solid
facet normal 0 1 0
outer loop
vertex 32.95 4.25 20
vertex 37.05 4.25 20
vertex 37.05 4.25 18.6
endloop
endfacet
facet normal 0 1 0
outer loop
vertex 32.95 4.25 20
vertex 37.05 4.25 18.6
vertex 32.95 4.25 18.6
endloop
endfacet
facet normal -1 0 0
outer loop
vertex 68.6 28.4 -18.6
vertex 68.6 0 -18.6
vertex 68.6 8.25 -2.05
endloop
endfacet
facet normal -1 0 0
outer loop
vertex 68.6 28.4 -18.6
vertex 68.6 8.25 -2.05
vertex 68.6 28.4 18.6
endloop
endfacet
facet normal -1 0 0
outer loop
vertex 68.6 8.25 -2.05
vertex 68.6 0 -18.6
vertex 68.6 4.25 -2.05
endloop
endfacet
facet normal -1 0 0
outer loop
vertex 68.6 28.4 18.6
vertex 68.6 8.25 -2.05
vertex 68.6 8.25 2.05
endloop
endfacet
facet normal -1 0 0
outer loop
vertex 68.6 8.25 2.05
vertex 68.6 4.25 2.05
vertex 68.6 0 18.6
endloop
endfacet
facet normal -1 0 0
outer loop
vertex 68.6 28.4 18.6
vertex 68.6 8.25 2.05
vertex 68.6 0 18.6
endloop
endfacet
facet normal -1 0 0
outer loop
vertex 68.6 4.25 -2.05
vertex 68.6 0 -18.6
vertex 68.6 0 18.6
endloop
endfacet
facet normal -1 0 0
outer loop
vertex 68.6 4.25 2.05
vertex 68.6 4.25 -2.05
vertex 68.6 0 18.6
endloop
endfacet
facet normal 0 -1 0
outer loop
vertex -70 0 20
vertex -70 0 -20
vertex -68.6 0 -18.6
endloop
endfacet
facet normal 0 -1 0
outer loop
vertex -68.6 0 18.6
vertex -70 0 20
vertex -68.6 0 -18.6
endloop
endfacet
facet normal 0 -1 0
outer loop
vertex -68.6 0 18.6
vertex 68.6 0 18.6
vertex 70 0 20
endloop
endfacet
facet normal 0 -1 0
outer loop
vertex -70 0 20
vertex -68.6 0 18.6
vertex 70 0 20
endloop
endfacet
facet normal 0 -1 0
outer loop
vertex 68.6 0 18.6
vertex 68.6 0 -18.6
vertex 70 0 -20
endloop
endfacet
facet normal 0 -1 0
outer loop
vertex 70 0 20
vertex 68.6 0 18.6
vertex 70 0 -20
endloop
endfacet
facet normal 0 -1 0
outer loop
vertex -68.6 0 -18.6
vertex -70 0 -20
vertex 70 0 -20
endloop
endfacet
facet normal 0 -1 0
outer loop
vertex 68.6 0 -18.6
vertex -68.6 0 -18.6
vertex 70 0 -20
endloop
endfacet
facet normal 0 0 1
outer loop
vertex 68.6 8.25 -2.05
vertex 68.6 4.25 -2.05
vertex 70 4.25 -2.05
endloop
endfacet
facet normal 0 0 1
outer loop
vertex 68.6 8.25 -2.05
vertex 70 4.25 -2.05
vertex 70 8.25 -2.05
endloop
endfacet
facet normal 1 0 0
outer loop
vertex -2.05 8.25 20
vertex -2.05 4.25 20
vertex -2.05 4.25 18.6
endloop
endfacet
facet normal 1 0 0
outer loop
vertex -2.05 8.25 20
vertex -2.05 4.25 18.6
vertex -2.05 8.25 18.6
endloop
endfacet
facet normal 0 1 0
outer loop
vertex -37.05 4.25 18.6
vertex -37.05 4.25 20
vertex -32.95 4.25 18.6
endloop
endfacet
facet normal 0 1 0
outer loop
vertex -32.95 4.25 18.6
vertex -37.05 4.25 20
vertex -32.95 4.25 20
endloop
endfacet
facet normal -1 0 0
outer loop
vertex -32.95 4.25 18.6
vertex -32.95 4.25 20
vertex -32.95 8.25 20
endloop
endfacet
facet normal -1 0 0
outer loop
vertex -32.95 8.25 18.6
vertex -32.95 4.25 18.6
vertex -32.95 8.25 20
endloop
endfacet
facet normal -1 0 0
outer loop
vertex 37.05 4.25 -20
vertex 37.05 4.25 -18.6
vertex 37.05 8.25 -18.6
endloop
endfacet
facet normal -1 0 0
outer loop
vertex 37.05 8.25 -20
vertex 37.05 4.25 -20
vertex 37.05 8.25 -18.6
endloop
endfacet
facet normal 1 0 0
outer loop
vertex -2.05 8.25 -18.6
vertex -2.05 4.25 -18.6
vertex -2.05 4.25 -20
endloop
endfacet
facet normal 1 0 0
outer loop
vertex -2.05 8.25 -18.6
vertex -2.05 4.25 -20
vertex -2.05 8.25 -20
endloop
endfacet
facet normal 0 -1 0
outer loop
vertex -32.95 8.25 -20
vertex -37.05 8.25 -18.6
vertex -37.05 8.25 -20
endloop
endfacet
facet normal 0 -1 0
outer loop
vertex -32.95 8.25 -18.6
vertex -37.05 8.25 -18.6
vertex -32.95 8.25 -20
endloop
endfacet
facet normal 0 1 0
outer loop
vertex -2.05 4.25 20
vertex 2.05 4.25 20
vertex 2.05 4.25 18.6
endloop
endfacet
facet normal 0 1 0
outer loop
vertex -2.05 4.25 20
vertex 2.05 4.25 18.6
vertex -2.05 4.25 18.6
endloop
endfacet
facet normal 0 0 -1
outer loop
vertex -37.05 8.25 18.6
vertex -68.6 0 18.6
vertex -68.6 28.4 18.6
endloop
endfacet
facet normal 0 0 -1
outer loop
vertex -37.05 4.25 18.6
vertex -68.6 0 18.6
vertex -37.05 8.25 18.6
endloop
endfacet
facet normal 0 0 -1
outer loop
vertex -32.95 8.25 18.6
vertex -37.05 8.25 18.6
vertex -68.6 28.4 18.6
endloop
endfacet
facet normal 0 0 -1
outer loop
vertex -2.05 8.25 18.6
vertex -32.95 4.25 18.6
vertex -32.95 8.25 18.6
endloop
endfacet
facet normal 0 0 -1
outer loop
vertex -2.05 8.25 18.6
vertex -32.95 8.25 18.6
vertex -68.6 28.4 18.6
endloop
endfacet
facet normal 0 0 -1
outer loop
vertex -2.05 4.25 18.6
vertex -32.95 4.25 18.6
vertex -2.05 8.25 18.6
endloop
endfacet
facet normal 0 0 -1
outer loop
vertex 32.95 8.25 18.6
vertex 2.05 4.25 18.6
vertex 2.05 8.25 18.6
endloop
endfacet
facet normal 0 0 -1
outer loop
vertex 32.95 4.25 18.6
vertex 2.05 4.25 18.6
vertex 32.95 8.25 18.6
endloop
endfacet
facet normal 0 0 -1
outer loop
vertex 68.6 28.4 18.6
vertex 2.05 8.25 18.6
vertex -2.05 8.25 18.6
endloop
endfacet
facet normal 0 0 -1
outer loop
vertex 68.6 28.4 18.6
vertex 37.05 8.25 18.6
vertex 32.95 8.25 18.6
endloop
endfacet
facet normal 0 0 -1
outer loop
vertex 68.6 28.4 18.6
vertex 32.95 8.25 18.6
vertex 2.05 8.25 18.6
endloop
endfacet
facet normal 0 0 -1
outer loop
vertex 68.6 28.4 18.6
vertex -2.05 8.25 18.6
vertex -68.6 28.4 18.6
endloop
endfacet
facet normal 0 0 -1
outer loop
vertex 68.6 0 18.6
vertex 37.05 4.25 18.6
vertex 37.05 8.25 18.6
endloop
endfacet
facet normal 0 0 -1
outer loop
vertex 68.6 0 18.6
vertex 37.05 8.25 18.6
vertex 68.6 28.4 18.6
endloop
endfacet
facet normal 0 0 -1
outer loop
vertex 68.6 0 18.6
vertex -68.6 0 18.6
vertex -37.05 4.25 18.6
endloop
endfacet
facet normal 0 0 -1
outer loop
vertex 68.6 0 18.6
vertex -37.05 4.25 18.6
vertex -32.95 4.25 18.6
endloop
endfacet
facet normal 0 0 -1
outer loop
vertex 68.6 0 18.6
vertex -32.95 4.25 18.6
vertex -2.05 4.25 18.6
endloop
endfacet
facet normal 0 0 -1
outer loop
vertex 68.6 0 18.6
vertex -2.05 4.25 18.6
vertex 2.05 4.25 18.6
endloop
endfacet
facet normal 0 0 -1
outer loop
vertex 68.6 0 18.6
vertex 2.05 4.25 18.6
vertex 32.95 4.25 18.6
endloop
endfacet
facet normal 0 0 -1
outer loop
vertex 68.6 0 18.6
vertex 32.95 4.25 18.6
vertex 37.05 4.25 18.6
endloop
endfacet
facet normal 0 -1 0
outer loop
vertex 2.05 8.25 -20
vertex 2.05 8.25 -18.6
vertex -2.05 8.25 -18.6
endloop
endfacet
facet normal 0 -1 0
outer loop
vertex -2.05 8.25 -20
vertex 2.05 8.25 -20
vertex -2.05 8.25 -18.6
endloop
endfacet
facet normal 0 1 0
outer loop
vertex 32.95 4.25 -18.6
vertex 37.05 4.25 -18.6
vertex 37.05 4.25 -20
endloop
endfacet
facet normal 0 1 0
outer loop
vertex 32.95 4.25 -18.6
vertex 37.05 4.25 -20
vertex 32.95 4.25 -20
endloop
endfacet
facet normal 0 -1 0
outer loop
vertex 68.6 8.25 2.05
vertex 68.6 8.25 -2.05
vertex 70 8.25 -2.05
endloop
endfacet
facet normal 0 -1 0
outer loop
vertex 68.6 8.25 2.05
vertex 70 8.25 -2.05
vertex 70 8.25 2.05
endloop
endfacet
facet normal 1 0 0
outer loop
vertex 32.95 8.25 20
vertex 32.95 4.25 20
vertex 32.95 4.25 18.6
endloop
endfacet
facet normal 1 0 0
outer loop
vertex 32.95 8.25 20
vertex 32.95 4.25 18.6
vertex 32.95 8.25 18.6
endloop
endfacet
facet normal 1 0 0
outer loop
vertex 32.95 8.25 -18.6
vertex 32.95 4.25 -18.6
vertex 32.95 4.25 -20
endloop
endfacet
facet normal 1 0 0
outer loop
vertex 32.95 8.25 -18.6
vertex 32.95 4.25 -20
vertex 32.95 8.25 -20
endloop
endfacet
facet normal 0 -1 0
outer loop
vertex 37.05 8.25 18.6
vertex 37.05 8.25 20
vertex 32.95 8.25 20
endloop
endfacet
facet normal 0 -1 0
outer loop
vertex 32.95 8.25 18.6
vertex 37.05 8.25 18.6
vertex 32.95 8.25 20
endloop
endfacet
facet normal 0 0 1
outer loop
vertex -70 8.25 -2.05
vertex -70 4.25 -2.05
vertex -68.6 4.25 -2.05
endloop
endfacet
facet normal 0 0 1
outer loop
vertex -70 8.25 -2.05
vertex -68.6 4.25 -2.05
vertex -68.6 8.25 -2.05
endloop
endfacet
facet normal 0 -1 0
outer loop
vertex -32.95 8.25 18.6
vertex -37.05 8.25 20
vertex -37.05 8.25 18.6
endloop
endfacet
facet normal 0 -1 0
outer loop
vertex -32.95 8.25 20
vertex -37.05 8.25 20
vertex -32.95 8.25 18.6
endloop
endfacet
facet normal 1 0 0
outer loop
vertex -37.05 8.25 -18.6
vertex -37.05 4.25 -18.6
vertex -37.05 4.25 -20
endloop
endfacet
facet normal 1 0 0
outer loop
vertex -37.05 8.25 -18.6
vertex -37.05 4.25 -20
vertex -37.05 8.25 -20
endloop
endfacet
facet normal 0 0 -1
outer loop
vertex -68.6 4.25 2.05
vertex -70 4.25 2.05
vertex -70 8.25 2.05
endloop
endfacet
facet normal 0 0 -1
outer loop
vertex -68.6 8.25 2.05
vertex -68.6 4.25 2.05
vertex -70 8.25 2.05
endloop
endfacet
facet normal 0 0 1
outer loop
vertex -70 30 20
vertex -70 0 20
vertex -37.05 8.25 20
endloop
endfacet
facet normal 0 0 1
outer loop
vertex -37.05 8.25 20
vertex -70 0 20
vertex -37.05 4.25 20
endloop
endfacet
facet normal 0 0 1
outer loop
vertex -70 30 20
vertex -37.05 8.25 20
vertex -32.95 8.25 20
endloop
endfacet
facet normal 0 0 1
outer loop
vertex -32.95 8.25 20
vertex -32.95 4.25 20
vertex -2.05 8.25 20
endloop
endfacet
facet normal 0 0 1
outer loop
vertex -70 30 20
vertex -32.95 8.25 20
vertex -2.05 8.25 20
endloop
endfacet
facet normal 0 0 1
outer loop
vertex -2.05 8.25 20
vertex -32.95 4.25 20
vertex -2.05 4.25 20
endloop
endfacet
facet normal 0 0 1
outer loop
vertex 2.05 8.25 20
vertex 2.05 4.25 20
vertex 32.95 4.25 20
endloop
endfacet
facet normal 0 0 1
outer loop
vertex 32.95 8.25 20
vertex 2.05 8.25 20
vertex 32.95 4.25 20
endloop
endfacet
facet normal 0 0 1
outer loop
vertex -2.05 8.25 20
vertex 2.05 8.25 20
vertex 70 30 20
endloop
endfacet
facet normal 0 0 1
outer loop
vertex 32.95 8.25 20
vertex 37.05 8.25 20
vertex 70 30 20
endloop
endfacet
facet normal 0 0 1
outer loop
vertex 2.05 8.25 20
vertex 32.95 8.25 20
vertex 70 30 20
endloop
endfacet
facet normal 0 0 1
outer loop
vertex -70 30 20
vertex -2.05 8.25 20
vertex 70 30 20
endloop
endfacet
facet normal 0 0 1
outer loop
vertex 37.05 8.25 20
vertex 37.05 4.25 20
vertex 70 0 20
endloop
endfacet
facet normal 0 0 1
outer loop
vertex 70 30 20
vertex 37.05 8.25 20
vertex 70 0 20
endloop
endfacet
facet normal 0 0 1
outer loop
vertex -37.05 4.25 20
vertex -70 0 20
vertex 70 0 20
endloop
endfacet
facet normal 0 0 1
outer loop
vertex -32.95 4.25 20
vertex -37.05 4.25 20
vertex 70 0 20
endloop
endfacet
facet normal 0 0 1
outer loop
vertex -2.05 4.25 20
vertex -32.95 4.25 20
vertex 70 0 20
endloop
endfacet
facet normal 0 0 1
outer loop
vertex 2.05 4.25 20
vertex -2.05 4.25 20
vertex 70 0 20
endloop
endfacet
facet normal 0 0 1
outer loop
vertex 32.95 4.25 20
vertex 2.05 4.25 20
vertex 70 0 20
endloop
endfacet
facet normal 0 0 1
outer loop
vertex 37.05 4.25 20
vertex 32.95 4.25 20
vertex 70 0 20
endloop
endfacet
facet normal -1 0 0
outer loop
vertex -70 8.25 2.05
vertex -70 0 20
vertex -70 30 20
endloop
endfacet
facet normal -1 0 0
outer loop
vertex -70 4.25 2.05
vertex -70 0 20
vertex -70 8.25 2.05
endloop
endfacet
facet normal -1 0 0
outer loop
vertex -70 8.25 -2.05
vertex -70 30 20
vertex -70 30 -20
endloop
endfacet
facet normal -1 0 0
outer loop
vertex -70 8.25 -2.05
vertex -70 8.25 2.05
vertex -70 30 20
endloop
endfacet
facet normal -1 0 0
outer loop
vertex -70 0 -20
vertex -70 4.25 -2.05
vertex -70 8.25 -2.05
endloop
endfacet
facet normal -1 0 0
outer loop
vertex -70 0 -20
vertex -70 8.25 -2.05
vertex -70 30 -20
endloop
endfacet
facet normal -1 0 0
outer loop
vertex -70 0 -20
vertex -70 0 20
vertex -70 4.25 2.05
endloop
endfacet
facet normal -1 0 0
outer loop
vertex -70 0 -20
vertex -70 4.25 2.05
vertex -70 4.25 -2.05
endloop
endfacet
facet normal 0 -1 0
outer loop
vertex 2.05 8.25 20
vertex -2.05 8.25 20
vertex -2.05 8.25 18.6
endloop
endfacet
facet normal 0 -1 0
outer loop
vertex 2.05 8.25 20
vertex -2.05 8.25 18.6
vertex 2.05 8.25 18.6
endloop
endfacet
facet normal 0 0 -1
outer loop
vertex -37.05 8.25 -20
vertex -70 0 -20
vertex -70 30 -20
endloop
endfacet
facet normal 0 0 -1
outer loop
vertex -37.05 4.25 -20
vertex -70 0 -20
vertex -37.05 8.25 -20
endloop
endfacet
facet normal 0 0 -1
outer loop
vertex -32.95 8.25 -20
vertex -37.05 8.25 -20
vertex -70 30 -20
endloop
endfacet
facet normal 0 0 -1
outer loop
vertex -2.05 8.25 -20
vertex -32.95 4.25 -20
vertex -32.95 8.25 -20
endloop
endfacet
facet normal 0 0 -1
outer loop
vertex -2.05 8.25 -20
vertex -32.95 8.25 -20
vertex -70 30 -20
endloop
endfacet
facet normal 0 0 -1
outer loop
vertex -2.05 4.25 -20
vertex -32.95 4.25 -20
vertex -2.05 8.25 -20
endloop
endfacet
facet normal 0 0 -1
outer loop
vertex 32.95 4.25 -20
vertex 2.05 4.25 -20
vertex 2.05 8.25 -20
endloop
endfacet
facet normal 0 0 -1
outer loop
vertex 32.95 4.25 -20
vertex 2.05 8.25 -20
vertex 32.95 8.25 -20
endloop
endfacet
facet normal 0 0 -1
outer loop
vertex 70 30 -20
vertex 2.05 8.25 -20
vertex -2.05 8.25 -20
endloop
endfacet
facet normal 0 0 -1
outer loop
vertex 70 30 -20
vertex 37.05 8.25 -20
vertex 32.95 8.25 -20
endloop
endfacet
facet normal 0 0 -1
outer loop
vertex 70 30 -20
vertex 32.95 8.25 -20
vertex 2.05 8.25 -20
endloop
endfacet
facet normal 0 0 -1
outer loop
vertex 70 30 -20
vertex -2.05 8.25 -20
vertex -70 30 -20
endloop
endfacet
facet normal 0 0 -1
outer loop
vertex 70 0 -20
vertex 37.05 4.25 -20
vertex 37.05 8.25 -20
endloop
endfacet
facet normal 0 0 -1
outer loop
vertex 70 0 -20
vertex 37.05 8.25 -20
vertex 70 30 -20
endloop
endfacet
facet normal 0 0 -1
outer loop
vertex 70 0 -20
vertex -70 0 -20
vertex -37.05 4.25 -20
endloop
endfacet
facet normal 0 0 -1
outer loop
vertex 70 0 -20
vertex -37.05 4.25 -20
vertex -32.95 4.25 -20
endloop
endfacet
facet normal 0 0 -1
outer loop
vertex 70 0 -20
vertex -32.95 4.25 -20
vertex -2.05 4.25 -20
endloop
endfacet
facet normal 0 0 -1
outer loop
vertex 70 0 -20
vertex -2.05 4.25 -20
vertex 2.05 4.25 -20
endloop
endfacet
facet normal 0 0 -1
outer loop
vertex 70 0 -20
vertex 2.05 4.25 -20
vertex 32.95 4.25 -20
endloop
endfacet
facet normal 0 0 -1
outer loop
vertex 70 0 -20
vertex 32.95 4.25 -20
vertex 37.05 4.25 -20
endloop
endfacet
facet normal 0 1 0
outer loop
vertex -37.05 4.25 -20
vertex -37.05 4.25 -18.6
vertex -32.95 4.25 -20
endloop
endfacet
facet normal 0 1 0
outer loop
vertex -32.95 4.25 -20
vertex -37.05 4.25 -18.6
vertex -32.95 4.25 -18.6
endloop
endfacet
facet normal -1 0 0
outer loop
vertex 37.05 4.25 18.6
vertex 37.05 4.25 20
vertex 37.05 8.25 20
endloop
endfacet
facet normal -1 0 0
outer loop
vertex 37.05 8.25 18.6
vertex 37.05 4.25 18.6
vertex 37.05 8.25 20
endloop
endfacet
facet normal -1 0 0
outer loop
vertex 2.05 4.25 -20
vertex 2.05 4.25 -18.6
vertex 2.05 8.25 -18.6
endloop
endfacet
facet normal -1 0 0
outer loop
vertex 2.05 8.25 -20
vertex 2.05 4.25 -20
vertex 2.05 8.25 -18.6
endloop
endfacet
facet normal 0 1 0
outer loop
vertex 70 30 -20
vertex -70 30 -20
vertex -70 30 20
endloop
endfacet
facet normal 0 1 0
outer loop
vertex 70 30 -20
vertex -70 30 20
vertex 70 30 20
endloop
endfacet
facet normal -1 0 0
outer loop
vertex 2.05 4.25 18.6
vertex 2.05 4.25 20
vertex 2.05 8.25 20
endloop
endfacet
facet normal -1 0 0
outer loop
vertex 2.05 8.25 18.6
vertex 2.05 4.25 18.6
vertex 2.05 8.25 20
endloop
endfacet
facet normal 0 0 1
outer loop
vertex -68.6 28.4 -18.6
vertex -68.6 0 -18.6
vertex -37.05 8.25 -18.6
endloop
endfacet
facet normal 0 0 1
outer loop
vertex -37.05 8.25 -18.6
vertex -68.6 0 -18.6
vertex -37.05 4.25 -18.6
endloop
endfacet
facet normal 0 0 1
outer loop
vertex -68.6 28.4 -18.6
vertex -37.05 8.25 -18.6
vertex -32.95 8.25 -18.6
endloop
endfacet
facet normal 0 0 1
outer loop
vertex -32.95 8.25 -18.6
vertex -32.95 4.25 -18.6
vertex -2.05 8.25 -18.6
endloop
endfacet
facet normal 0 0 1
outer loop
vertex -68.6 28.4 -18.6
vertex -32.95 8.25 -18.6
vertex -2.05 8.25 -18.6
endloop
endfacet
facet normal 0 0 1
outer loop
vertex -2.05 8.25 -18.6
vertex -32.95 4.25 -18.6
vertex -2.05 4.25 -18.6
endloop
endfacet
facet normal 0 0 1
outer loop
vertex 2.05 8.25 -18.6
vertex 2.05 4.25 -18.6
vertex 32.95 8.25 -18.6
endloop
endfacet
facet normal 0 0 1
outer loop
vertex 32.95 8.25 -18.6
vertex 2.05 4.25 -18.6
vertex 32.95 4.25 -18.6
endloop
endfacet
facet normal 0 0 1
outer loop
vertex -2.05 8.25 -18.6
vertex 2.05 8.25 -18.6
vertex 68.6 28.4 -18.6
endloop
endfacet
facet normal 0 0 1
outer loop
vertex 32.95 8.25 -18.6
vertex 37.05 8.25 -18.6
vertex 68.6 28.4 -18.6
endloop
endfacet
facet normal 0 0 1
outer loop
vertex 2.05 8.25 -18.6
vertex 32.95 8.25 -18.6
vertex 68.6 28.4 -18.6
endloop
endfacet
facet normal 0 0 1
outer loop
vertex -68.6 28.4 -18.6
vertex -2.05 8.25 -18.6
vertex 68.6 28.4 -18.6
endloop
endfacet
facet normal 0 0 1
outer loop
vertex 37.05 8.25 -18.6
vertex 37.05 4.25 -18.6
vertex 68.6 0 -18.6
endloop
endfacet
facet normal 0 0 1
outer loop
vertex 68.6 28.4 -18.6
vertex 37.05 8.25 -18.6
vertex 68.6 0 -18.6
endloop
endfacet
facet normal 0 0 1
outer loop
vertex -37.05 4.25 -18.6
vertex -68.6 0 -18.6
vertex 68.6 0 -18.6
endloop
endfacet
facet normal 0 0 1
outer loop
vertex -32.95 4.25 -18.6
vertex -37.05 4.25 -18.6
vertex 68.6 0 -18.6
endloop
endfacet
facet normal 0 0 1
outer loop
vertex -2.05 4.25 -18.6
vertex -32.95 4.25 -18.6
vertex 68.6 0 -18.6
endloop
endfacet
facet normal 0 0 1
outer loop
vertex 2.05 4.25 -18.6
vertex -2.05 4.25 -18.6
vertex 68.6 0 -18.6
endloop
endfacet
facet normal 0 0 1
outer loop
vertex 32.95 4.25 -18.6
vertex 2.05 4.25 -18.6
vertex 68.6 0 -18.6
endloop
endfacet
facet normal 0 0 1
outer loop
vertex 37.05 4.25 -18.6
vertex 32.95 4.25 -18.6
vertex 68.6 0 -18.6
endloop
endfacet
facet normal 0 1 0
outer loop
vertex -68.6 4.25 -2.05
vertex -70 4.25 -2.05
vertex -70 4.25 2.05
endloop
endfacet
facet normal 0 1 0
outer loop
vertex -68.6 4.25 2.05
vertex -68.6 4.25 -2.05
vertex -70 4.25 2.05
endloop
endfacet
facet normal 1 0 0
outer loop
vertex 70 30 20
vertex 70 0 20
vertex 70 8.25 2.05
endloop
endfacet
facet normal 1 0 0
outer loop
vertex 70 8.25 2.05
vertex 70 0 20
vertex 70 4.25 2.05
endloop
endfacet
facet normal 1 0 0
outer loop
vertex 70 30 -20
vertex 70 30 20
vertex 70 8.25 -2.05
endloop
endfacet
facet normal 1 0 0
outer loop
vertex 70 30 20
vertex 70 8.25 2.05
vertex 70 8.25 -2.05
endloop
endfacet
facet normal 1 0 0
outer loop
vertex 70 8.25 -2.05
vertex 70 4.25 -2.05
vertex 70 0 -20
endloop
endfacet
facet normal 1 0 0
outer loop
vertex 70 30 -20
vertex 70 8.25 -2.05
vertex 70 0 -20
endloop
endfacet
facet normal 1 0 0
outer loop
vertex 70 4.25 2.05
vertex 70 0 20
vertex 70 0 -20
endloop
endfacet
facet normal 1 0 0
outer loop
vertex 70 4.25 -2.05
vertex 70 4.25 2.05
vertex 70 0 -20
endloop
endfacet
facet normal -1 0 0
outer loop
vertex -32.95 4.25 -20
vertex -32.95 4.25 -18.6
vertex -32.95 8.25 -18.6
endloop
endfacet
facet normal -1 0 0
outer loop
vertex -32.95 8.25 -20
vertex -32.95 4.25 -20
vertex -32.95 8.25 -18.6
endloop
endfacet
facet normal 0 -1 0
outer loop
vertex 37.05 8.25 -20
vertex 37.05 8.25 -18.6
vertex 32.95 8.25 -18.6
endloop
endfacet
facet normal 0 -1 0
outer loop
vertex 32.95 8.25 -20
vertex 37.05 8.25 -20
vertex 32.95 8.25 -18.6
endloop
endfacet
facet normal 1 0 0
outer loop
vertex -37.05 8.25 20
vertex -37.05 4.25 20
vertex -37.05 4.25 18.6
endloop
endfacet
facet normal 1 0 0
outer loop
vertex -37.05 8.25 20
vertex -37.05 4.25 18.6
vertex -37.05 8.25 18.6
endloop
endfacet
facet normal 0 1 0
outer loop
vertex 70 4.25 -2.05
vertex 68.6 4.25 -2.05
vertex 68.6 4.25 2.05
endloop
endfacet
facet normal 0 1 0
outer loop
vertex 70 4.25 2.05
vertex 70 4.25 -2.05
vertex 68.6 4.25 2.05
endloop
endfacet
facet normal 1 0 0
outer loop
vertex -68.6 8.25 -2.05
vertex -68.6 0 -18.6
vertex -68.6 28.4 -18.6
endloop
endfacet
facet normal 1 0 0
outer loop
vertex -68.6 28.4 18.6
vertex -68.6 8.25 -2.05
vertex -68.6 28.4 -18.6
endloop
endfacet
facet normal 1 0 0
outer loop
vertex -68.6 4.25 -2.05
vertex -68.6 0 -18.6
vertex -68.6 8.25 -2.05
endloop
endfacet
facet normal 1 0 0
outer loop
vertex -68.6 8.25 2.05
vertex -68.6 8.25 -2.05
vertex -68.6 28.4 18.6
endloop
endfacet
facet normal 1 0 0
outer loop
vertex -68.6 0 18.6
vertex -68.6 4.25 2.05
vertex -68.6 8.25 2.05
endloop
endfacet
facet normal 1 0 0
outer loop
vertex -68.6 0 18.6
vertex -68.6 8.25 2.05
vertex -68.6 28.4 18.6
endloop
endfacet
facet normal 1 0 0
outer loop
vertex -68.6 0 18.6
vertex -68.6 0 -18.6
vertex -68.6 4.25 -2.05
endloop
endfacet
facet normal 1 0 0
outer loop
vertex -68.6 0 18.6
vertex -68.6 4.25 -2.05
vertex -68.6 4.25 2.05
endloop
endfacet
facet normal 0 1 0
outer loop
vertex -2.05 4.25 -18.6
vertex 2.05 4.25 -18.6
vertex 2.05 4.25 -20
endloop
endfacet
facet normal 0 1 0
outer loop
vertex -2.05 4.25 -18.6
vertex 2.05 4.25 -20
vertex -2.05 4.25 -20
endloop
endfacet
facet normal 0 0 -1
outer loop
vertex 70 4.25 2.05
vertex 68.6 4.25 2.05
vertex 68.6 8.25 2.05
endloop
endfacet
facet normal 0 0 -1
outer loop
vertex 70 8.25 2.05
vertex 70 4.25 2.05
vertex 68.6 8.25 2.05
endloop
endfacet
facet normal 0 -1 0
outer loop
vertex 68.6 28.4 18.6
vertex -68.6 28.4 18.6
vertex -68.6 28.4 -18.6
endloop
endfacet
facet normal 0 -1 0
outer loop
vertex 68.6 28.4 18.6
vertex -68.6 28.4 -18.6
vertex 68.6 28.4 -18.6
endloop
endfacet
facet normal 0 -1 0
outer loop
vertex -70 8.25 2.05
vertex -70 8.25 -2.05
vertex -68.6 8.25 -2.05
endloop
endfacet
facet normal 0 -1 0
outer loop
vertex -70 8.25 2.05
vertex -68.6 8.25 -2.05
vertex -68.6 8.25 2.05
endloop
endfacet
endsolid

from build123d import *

# Parameters (mm, degrees)
SKETCH1_W           = 140
SKETCH1_H           = 40
BOSS_EXTRUDE1_DEPTH = 30
SKETCH2_W           = 137.2
SKETCH2_H           = 37.2
CUT_EXTRUDE1_DEPTH  = 28.4
SKETCH3_W           = 4.1
SKETCH3_H           = 4
CUT_EXTRUDE2_DEPTH  = 141
SKETCH4_W           = 2.05
SKETCH4_H           = 4
SKETCH4_W_2         = 4.1
CUT_EXTRUDE3_DEPTH  = 41


with BuildPart() as part:
    # Sketch1 → Boss-Extrude1 (new body)
    with BuildSketch(Plane(origin=(0, 0, 0), x_dir=(1, 0, 0), z_dir=(0, 1, 0))):
        Rectangle(SKETCH1_W, SKETCH1_H)
    extrude(amount=BOSS_EXTRUDE1_DEPTH)

    # Sketch2 → Cut-Extrude1 (cut)
    with BuildSketch(Plane.XZ):
        Rectangle(SKETCH2_W, SKETCH2_H)
    extrude(amount=-CUT_EXTRUDE1_DEPTH, mode=Mode.SUBTRACT)

    # Sketch3 → Cut-Extrude2 (cut, through all)
    with BuildSketch(Plane.ZY.offset(70)):
        with Locations((0, 6.25)):
            Rectangle(SKETCH3_W, SKETCH3_H)
    extrude(amount=-CUT_EXTRUDE2_DEPTH, mode=Mode.SUBTRACT)

    # Sketch4 → Cut-Extrude3 (cut, through all)
    with BuildSketch(Plane.XY.offset(20)):
        with Locations((-1.025, 6.25)):
            Rectangle(SKETCH4_W, SKETCH4_H)
        with Locations((-35, 6.25)):
            Rectangle(SKETCH4_W_2, SKETCH4_H)
    cut_extrude3 = extrude(amount=-CUT_EXTRUDE3_DEPTH, mode=Mode.SUBTRACT)

    # Mirror1: Cut-Extrude3 across plane
    add(cut_extrude3.mirror(Plane(origin=(0, 0, 0), x_dir=(0, 0, 1), z_dir=(1, 0, 0))), mode=Mode.SUBTRACT)


solid = part.part
